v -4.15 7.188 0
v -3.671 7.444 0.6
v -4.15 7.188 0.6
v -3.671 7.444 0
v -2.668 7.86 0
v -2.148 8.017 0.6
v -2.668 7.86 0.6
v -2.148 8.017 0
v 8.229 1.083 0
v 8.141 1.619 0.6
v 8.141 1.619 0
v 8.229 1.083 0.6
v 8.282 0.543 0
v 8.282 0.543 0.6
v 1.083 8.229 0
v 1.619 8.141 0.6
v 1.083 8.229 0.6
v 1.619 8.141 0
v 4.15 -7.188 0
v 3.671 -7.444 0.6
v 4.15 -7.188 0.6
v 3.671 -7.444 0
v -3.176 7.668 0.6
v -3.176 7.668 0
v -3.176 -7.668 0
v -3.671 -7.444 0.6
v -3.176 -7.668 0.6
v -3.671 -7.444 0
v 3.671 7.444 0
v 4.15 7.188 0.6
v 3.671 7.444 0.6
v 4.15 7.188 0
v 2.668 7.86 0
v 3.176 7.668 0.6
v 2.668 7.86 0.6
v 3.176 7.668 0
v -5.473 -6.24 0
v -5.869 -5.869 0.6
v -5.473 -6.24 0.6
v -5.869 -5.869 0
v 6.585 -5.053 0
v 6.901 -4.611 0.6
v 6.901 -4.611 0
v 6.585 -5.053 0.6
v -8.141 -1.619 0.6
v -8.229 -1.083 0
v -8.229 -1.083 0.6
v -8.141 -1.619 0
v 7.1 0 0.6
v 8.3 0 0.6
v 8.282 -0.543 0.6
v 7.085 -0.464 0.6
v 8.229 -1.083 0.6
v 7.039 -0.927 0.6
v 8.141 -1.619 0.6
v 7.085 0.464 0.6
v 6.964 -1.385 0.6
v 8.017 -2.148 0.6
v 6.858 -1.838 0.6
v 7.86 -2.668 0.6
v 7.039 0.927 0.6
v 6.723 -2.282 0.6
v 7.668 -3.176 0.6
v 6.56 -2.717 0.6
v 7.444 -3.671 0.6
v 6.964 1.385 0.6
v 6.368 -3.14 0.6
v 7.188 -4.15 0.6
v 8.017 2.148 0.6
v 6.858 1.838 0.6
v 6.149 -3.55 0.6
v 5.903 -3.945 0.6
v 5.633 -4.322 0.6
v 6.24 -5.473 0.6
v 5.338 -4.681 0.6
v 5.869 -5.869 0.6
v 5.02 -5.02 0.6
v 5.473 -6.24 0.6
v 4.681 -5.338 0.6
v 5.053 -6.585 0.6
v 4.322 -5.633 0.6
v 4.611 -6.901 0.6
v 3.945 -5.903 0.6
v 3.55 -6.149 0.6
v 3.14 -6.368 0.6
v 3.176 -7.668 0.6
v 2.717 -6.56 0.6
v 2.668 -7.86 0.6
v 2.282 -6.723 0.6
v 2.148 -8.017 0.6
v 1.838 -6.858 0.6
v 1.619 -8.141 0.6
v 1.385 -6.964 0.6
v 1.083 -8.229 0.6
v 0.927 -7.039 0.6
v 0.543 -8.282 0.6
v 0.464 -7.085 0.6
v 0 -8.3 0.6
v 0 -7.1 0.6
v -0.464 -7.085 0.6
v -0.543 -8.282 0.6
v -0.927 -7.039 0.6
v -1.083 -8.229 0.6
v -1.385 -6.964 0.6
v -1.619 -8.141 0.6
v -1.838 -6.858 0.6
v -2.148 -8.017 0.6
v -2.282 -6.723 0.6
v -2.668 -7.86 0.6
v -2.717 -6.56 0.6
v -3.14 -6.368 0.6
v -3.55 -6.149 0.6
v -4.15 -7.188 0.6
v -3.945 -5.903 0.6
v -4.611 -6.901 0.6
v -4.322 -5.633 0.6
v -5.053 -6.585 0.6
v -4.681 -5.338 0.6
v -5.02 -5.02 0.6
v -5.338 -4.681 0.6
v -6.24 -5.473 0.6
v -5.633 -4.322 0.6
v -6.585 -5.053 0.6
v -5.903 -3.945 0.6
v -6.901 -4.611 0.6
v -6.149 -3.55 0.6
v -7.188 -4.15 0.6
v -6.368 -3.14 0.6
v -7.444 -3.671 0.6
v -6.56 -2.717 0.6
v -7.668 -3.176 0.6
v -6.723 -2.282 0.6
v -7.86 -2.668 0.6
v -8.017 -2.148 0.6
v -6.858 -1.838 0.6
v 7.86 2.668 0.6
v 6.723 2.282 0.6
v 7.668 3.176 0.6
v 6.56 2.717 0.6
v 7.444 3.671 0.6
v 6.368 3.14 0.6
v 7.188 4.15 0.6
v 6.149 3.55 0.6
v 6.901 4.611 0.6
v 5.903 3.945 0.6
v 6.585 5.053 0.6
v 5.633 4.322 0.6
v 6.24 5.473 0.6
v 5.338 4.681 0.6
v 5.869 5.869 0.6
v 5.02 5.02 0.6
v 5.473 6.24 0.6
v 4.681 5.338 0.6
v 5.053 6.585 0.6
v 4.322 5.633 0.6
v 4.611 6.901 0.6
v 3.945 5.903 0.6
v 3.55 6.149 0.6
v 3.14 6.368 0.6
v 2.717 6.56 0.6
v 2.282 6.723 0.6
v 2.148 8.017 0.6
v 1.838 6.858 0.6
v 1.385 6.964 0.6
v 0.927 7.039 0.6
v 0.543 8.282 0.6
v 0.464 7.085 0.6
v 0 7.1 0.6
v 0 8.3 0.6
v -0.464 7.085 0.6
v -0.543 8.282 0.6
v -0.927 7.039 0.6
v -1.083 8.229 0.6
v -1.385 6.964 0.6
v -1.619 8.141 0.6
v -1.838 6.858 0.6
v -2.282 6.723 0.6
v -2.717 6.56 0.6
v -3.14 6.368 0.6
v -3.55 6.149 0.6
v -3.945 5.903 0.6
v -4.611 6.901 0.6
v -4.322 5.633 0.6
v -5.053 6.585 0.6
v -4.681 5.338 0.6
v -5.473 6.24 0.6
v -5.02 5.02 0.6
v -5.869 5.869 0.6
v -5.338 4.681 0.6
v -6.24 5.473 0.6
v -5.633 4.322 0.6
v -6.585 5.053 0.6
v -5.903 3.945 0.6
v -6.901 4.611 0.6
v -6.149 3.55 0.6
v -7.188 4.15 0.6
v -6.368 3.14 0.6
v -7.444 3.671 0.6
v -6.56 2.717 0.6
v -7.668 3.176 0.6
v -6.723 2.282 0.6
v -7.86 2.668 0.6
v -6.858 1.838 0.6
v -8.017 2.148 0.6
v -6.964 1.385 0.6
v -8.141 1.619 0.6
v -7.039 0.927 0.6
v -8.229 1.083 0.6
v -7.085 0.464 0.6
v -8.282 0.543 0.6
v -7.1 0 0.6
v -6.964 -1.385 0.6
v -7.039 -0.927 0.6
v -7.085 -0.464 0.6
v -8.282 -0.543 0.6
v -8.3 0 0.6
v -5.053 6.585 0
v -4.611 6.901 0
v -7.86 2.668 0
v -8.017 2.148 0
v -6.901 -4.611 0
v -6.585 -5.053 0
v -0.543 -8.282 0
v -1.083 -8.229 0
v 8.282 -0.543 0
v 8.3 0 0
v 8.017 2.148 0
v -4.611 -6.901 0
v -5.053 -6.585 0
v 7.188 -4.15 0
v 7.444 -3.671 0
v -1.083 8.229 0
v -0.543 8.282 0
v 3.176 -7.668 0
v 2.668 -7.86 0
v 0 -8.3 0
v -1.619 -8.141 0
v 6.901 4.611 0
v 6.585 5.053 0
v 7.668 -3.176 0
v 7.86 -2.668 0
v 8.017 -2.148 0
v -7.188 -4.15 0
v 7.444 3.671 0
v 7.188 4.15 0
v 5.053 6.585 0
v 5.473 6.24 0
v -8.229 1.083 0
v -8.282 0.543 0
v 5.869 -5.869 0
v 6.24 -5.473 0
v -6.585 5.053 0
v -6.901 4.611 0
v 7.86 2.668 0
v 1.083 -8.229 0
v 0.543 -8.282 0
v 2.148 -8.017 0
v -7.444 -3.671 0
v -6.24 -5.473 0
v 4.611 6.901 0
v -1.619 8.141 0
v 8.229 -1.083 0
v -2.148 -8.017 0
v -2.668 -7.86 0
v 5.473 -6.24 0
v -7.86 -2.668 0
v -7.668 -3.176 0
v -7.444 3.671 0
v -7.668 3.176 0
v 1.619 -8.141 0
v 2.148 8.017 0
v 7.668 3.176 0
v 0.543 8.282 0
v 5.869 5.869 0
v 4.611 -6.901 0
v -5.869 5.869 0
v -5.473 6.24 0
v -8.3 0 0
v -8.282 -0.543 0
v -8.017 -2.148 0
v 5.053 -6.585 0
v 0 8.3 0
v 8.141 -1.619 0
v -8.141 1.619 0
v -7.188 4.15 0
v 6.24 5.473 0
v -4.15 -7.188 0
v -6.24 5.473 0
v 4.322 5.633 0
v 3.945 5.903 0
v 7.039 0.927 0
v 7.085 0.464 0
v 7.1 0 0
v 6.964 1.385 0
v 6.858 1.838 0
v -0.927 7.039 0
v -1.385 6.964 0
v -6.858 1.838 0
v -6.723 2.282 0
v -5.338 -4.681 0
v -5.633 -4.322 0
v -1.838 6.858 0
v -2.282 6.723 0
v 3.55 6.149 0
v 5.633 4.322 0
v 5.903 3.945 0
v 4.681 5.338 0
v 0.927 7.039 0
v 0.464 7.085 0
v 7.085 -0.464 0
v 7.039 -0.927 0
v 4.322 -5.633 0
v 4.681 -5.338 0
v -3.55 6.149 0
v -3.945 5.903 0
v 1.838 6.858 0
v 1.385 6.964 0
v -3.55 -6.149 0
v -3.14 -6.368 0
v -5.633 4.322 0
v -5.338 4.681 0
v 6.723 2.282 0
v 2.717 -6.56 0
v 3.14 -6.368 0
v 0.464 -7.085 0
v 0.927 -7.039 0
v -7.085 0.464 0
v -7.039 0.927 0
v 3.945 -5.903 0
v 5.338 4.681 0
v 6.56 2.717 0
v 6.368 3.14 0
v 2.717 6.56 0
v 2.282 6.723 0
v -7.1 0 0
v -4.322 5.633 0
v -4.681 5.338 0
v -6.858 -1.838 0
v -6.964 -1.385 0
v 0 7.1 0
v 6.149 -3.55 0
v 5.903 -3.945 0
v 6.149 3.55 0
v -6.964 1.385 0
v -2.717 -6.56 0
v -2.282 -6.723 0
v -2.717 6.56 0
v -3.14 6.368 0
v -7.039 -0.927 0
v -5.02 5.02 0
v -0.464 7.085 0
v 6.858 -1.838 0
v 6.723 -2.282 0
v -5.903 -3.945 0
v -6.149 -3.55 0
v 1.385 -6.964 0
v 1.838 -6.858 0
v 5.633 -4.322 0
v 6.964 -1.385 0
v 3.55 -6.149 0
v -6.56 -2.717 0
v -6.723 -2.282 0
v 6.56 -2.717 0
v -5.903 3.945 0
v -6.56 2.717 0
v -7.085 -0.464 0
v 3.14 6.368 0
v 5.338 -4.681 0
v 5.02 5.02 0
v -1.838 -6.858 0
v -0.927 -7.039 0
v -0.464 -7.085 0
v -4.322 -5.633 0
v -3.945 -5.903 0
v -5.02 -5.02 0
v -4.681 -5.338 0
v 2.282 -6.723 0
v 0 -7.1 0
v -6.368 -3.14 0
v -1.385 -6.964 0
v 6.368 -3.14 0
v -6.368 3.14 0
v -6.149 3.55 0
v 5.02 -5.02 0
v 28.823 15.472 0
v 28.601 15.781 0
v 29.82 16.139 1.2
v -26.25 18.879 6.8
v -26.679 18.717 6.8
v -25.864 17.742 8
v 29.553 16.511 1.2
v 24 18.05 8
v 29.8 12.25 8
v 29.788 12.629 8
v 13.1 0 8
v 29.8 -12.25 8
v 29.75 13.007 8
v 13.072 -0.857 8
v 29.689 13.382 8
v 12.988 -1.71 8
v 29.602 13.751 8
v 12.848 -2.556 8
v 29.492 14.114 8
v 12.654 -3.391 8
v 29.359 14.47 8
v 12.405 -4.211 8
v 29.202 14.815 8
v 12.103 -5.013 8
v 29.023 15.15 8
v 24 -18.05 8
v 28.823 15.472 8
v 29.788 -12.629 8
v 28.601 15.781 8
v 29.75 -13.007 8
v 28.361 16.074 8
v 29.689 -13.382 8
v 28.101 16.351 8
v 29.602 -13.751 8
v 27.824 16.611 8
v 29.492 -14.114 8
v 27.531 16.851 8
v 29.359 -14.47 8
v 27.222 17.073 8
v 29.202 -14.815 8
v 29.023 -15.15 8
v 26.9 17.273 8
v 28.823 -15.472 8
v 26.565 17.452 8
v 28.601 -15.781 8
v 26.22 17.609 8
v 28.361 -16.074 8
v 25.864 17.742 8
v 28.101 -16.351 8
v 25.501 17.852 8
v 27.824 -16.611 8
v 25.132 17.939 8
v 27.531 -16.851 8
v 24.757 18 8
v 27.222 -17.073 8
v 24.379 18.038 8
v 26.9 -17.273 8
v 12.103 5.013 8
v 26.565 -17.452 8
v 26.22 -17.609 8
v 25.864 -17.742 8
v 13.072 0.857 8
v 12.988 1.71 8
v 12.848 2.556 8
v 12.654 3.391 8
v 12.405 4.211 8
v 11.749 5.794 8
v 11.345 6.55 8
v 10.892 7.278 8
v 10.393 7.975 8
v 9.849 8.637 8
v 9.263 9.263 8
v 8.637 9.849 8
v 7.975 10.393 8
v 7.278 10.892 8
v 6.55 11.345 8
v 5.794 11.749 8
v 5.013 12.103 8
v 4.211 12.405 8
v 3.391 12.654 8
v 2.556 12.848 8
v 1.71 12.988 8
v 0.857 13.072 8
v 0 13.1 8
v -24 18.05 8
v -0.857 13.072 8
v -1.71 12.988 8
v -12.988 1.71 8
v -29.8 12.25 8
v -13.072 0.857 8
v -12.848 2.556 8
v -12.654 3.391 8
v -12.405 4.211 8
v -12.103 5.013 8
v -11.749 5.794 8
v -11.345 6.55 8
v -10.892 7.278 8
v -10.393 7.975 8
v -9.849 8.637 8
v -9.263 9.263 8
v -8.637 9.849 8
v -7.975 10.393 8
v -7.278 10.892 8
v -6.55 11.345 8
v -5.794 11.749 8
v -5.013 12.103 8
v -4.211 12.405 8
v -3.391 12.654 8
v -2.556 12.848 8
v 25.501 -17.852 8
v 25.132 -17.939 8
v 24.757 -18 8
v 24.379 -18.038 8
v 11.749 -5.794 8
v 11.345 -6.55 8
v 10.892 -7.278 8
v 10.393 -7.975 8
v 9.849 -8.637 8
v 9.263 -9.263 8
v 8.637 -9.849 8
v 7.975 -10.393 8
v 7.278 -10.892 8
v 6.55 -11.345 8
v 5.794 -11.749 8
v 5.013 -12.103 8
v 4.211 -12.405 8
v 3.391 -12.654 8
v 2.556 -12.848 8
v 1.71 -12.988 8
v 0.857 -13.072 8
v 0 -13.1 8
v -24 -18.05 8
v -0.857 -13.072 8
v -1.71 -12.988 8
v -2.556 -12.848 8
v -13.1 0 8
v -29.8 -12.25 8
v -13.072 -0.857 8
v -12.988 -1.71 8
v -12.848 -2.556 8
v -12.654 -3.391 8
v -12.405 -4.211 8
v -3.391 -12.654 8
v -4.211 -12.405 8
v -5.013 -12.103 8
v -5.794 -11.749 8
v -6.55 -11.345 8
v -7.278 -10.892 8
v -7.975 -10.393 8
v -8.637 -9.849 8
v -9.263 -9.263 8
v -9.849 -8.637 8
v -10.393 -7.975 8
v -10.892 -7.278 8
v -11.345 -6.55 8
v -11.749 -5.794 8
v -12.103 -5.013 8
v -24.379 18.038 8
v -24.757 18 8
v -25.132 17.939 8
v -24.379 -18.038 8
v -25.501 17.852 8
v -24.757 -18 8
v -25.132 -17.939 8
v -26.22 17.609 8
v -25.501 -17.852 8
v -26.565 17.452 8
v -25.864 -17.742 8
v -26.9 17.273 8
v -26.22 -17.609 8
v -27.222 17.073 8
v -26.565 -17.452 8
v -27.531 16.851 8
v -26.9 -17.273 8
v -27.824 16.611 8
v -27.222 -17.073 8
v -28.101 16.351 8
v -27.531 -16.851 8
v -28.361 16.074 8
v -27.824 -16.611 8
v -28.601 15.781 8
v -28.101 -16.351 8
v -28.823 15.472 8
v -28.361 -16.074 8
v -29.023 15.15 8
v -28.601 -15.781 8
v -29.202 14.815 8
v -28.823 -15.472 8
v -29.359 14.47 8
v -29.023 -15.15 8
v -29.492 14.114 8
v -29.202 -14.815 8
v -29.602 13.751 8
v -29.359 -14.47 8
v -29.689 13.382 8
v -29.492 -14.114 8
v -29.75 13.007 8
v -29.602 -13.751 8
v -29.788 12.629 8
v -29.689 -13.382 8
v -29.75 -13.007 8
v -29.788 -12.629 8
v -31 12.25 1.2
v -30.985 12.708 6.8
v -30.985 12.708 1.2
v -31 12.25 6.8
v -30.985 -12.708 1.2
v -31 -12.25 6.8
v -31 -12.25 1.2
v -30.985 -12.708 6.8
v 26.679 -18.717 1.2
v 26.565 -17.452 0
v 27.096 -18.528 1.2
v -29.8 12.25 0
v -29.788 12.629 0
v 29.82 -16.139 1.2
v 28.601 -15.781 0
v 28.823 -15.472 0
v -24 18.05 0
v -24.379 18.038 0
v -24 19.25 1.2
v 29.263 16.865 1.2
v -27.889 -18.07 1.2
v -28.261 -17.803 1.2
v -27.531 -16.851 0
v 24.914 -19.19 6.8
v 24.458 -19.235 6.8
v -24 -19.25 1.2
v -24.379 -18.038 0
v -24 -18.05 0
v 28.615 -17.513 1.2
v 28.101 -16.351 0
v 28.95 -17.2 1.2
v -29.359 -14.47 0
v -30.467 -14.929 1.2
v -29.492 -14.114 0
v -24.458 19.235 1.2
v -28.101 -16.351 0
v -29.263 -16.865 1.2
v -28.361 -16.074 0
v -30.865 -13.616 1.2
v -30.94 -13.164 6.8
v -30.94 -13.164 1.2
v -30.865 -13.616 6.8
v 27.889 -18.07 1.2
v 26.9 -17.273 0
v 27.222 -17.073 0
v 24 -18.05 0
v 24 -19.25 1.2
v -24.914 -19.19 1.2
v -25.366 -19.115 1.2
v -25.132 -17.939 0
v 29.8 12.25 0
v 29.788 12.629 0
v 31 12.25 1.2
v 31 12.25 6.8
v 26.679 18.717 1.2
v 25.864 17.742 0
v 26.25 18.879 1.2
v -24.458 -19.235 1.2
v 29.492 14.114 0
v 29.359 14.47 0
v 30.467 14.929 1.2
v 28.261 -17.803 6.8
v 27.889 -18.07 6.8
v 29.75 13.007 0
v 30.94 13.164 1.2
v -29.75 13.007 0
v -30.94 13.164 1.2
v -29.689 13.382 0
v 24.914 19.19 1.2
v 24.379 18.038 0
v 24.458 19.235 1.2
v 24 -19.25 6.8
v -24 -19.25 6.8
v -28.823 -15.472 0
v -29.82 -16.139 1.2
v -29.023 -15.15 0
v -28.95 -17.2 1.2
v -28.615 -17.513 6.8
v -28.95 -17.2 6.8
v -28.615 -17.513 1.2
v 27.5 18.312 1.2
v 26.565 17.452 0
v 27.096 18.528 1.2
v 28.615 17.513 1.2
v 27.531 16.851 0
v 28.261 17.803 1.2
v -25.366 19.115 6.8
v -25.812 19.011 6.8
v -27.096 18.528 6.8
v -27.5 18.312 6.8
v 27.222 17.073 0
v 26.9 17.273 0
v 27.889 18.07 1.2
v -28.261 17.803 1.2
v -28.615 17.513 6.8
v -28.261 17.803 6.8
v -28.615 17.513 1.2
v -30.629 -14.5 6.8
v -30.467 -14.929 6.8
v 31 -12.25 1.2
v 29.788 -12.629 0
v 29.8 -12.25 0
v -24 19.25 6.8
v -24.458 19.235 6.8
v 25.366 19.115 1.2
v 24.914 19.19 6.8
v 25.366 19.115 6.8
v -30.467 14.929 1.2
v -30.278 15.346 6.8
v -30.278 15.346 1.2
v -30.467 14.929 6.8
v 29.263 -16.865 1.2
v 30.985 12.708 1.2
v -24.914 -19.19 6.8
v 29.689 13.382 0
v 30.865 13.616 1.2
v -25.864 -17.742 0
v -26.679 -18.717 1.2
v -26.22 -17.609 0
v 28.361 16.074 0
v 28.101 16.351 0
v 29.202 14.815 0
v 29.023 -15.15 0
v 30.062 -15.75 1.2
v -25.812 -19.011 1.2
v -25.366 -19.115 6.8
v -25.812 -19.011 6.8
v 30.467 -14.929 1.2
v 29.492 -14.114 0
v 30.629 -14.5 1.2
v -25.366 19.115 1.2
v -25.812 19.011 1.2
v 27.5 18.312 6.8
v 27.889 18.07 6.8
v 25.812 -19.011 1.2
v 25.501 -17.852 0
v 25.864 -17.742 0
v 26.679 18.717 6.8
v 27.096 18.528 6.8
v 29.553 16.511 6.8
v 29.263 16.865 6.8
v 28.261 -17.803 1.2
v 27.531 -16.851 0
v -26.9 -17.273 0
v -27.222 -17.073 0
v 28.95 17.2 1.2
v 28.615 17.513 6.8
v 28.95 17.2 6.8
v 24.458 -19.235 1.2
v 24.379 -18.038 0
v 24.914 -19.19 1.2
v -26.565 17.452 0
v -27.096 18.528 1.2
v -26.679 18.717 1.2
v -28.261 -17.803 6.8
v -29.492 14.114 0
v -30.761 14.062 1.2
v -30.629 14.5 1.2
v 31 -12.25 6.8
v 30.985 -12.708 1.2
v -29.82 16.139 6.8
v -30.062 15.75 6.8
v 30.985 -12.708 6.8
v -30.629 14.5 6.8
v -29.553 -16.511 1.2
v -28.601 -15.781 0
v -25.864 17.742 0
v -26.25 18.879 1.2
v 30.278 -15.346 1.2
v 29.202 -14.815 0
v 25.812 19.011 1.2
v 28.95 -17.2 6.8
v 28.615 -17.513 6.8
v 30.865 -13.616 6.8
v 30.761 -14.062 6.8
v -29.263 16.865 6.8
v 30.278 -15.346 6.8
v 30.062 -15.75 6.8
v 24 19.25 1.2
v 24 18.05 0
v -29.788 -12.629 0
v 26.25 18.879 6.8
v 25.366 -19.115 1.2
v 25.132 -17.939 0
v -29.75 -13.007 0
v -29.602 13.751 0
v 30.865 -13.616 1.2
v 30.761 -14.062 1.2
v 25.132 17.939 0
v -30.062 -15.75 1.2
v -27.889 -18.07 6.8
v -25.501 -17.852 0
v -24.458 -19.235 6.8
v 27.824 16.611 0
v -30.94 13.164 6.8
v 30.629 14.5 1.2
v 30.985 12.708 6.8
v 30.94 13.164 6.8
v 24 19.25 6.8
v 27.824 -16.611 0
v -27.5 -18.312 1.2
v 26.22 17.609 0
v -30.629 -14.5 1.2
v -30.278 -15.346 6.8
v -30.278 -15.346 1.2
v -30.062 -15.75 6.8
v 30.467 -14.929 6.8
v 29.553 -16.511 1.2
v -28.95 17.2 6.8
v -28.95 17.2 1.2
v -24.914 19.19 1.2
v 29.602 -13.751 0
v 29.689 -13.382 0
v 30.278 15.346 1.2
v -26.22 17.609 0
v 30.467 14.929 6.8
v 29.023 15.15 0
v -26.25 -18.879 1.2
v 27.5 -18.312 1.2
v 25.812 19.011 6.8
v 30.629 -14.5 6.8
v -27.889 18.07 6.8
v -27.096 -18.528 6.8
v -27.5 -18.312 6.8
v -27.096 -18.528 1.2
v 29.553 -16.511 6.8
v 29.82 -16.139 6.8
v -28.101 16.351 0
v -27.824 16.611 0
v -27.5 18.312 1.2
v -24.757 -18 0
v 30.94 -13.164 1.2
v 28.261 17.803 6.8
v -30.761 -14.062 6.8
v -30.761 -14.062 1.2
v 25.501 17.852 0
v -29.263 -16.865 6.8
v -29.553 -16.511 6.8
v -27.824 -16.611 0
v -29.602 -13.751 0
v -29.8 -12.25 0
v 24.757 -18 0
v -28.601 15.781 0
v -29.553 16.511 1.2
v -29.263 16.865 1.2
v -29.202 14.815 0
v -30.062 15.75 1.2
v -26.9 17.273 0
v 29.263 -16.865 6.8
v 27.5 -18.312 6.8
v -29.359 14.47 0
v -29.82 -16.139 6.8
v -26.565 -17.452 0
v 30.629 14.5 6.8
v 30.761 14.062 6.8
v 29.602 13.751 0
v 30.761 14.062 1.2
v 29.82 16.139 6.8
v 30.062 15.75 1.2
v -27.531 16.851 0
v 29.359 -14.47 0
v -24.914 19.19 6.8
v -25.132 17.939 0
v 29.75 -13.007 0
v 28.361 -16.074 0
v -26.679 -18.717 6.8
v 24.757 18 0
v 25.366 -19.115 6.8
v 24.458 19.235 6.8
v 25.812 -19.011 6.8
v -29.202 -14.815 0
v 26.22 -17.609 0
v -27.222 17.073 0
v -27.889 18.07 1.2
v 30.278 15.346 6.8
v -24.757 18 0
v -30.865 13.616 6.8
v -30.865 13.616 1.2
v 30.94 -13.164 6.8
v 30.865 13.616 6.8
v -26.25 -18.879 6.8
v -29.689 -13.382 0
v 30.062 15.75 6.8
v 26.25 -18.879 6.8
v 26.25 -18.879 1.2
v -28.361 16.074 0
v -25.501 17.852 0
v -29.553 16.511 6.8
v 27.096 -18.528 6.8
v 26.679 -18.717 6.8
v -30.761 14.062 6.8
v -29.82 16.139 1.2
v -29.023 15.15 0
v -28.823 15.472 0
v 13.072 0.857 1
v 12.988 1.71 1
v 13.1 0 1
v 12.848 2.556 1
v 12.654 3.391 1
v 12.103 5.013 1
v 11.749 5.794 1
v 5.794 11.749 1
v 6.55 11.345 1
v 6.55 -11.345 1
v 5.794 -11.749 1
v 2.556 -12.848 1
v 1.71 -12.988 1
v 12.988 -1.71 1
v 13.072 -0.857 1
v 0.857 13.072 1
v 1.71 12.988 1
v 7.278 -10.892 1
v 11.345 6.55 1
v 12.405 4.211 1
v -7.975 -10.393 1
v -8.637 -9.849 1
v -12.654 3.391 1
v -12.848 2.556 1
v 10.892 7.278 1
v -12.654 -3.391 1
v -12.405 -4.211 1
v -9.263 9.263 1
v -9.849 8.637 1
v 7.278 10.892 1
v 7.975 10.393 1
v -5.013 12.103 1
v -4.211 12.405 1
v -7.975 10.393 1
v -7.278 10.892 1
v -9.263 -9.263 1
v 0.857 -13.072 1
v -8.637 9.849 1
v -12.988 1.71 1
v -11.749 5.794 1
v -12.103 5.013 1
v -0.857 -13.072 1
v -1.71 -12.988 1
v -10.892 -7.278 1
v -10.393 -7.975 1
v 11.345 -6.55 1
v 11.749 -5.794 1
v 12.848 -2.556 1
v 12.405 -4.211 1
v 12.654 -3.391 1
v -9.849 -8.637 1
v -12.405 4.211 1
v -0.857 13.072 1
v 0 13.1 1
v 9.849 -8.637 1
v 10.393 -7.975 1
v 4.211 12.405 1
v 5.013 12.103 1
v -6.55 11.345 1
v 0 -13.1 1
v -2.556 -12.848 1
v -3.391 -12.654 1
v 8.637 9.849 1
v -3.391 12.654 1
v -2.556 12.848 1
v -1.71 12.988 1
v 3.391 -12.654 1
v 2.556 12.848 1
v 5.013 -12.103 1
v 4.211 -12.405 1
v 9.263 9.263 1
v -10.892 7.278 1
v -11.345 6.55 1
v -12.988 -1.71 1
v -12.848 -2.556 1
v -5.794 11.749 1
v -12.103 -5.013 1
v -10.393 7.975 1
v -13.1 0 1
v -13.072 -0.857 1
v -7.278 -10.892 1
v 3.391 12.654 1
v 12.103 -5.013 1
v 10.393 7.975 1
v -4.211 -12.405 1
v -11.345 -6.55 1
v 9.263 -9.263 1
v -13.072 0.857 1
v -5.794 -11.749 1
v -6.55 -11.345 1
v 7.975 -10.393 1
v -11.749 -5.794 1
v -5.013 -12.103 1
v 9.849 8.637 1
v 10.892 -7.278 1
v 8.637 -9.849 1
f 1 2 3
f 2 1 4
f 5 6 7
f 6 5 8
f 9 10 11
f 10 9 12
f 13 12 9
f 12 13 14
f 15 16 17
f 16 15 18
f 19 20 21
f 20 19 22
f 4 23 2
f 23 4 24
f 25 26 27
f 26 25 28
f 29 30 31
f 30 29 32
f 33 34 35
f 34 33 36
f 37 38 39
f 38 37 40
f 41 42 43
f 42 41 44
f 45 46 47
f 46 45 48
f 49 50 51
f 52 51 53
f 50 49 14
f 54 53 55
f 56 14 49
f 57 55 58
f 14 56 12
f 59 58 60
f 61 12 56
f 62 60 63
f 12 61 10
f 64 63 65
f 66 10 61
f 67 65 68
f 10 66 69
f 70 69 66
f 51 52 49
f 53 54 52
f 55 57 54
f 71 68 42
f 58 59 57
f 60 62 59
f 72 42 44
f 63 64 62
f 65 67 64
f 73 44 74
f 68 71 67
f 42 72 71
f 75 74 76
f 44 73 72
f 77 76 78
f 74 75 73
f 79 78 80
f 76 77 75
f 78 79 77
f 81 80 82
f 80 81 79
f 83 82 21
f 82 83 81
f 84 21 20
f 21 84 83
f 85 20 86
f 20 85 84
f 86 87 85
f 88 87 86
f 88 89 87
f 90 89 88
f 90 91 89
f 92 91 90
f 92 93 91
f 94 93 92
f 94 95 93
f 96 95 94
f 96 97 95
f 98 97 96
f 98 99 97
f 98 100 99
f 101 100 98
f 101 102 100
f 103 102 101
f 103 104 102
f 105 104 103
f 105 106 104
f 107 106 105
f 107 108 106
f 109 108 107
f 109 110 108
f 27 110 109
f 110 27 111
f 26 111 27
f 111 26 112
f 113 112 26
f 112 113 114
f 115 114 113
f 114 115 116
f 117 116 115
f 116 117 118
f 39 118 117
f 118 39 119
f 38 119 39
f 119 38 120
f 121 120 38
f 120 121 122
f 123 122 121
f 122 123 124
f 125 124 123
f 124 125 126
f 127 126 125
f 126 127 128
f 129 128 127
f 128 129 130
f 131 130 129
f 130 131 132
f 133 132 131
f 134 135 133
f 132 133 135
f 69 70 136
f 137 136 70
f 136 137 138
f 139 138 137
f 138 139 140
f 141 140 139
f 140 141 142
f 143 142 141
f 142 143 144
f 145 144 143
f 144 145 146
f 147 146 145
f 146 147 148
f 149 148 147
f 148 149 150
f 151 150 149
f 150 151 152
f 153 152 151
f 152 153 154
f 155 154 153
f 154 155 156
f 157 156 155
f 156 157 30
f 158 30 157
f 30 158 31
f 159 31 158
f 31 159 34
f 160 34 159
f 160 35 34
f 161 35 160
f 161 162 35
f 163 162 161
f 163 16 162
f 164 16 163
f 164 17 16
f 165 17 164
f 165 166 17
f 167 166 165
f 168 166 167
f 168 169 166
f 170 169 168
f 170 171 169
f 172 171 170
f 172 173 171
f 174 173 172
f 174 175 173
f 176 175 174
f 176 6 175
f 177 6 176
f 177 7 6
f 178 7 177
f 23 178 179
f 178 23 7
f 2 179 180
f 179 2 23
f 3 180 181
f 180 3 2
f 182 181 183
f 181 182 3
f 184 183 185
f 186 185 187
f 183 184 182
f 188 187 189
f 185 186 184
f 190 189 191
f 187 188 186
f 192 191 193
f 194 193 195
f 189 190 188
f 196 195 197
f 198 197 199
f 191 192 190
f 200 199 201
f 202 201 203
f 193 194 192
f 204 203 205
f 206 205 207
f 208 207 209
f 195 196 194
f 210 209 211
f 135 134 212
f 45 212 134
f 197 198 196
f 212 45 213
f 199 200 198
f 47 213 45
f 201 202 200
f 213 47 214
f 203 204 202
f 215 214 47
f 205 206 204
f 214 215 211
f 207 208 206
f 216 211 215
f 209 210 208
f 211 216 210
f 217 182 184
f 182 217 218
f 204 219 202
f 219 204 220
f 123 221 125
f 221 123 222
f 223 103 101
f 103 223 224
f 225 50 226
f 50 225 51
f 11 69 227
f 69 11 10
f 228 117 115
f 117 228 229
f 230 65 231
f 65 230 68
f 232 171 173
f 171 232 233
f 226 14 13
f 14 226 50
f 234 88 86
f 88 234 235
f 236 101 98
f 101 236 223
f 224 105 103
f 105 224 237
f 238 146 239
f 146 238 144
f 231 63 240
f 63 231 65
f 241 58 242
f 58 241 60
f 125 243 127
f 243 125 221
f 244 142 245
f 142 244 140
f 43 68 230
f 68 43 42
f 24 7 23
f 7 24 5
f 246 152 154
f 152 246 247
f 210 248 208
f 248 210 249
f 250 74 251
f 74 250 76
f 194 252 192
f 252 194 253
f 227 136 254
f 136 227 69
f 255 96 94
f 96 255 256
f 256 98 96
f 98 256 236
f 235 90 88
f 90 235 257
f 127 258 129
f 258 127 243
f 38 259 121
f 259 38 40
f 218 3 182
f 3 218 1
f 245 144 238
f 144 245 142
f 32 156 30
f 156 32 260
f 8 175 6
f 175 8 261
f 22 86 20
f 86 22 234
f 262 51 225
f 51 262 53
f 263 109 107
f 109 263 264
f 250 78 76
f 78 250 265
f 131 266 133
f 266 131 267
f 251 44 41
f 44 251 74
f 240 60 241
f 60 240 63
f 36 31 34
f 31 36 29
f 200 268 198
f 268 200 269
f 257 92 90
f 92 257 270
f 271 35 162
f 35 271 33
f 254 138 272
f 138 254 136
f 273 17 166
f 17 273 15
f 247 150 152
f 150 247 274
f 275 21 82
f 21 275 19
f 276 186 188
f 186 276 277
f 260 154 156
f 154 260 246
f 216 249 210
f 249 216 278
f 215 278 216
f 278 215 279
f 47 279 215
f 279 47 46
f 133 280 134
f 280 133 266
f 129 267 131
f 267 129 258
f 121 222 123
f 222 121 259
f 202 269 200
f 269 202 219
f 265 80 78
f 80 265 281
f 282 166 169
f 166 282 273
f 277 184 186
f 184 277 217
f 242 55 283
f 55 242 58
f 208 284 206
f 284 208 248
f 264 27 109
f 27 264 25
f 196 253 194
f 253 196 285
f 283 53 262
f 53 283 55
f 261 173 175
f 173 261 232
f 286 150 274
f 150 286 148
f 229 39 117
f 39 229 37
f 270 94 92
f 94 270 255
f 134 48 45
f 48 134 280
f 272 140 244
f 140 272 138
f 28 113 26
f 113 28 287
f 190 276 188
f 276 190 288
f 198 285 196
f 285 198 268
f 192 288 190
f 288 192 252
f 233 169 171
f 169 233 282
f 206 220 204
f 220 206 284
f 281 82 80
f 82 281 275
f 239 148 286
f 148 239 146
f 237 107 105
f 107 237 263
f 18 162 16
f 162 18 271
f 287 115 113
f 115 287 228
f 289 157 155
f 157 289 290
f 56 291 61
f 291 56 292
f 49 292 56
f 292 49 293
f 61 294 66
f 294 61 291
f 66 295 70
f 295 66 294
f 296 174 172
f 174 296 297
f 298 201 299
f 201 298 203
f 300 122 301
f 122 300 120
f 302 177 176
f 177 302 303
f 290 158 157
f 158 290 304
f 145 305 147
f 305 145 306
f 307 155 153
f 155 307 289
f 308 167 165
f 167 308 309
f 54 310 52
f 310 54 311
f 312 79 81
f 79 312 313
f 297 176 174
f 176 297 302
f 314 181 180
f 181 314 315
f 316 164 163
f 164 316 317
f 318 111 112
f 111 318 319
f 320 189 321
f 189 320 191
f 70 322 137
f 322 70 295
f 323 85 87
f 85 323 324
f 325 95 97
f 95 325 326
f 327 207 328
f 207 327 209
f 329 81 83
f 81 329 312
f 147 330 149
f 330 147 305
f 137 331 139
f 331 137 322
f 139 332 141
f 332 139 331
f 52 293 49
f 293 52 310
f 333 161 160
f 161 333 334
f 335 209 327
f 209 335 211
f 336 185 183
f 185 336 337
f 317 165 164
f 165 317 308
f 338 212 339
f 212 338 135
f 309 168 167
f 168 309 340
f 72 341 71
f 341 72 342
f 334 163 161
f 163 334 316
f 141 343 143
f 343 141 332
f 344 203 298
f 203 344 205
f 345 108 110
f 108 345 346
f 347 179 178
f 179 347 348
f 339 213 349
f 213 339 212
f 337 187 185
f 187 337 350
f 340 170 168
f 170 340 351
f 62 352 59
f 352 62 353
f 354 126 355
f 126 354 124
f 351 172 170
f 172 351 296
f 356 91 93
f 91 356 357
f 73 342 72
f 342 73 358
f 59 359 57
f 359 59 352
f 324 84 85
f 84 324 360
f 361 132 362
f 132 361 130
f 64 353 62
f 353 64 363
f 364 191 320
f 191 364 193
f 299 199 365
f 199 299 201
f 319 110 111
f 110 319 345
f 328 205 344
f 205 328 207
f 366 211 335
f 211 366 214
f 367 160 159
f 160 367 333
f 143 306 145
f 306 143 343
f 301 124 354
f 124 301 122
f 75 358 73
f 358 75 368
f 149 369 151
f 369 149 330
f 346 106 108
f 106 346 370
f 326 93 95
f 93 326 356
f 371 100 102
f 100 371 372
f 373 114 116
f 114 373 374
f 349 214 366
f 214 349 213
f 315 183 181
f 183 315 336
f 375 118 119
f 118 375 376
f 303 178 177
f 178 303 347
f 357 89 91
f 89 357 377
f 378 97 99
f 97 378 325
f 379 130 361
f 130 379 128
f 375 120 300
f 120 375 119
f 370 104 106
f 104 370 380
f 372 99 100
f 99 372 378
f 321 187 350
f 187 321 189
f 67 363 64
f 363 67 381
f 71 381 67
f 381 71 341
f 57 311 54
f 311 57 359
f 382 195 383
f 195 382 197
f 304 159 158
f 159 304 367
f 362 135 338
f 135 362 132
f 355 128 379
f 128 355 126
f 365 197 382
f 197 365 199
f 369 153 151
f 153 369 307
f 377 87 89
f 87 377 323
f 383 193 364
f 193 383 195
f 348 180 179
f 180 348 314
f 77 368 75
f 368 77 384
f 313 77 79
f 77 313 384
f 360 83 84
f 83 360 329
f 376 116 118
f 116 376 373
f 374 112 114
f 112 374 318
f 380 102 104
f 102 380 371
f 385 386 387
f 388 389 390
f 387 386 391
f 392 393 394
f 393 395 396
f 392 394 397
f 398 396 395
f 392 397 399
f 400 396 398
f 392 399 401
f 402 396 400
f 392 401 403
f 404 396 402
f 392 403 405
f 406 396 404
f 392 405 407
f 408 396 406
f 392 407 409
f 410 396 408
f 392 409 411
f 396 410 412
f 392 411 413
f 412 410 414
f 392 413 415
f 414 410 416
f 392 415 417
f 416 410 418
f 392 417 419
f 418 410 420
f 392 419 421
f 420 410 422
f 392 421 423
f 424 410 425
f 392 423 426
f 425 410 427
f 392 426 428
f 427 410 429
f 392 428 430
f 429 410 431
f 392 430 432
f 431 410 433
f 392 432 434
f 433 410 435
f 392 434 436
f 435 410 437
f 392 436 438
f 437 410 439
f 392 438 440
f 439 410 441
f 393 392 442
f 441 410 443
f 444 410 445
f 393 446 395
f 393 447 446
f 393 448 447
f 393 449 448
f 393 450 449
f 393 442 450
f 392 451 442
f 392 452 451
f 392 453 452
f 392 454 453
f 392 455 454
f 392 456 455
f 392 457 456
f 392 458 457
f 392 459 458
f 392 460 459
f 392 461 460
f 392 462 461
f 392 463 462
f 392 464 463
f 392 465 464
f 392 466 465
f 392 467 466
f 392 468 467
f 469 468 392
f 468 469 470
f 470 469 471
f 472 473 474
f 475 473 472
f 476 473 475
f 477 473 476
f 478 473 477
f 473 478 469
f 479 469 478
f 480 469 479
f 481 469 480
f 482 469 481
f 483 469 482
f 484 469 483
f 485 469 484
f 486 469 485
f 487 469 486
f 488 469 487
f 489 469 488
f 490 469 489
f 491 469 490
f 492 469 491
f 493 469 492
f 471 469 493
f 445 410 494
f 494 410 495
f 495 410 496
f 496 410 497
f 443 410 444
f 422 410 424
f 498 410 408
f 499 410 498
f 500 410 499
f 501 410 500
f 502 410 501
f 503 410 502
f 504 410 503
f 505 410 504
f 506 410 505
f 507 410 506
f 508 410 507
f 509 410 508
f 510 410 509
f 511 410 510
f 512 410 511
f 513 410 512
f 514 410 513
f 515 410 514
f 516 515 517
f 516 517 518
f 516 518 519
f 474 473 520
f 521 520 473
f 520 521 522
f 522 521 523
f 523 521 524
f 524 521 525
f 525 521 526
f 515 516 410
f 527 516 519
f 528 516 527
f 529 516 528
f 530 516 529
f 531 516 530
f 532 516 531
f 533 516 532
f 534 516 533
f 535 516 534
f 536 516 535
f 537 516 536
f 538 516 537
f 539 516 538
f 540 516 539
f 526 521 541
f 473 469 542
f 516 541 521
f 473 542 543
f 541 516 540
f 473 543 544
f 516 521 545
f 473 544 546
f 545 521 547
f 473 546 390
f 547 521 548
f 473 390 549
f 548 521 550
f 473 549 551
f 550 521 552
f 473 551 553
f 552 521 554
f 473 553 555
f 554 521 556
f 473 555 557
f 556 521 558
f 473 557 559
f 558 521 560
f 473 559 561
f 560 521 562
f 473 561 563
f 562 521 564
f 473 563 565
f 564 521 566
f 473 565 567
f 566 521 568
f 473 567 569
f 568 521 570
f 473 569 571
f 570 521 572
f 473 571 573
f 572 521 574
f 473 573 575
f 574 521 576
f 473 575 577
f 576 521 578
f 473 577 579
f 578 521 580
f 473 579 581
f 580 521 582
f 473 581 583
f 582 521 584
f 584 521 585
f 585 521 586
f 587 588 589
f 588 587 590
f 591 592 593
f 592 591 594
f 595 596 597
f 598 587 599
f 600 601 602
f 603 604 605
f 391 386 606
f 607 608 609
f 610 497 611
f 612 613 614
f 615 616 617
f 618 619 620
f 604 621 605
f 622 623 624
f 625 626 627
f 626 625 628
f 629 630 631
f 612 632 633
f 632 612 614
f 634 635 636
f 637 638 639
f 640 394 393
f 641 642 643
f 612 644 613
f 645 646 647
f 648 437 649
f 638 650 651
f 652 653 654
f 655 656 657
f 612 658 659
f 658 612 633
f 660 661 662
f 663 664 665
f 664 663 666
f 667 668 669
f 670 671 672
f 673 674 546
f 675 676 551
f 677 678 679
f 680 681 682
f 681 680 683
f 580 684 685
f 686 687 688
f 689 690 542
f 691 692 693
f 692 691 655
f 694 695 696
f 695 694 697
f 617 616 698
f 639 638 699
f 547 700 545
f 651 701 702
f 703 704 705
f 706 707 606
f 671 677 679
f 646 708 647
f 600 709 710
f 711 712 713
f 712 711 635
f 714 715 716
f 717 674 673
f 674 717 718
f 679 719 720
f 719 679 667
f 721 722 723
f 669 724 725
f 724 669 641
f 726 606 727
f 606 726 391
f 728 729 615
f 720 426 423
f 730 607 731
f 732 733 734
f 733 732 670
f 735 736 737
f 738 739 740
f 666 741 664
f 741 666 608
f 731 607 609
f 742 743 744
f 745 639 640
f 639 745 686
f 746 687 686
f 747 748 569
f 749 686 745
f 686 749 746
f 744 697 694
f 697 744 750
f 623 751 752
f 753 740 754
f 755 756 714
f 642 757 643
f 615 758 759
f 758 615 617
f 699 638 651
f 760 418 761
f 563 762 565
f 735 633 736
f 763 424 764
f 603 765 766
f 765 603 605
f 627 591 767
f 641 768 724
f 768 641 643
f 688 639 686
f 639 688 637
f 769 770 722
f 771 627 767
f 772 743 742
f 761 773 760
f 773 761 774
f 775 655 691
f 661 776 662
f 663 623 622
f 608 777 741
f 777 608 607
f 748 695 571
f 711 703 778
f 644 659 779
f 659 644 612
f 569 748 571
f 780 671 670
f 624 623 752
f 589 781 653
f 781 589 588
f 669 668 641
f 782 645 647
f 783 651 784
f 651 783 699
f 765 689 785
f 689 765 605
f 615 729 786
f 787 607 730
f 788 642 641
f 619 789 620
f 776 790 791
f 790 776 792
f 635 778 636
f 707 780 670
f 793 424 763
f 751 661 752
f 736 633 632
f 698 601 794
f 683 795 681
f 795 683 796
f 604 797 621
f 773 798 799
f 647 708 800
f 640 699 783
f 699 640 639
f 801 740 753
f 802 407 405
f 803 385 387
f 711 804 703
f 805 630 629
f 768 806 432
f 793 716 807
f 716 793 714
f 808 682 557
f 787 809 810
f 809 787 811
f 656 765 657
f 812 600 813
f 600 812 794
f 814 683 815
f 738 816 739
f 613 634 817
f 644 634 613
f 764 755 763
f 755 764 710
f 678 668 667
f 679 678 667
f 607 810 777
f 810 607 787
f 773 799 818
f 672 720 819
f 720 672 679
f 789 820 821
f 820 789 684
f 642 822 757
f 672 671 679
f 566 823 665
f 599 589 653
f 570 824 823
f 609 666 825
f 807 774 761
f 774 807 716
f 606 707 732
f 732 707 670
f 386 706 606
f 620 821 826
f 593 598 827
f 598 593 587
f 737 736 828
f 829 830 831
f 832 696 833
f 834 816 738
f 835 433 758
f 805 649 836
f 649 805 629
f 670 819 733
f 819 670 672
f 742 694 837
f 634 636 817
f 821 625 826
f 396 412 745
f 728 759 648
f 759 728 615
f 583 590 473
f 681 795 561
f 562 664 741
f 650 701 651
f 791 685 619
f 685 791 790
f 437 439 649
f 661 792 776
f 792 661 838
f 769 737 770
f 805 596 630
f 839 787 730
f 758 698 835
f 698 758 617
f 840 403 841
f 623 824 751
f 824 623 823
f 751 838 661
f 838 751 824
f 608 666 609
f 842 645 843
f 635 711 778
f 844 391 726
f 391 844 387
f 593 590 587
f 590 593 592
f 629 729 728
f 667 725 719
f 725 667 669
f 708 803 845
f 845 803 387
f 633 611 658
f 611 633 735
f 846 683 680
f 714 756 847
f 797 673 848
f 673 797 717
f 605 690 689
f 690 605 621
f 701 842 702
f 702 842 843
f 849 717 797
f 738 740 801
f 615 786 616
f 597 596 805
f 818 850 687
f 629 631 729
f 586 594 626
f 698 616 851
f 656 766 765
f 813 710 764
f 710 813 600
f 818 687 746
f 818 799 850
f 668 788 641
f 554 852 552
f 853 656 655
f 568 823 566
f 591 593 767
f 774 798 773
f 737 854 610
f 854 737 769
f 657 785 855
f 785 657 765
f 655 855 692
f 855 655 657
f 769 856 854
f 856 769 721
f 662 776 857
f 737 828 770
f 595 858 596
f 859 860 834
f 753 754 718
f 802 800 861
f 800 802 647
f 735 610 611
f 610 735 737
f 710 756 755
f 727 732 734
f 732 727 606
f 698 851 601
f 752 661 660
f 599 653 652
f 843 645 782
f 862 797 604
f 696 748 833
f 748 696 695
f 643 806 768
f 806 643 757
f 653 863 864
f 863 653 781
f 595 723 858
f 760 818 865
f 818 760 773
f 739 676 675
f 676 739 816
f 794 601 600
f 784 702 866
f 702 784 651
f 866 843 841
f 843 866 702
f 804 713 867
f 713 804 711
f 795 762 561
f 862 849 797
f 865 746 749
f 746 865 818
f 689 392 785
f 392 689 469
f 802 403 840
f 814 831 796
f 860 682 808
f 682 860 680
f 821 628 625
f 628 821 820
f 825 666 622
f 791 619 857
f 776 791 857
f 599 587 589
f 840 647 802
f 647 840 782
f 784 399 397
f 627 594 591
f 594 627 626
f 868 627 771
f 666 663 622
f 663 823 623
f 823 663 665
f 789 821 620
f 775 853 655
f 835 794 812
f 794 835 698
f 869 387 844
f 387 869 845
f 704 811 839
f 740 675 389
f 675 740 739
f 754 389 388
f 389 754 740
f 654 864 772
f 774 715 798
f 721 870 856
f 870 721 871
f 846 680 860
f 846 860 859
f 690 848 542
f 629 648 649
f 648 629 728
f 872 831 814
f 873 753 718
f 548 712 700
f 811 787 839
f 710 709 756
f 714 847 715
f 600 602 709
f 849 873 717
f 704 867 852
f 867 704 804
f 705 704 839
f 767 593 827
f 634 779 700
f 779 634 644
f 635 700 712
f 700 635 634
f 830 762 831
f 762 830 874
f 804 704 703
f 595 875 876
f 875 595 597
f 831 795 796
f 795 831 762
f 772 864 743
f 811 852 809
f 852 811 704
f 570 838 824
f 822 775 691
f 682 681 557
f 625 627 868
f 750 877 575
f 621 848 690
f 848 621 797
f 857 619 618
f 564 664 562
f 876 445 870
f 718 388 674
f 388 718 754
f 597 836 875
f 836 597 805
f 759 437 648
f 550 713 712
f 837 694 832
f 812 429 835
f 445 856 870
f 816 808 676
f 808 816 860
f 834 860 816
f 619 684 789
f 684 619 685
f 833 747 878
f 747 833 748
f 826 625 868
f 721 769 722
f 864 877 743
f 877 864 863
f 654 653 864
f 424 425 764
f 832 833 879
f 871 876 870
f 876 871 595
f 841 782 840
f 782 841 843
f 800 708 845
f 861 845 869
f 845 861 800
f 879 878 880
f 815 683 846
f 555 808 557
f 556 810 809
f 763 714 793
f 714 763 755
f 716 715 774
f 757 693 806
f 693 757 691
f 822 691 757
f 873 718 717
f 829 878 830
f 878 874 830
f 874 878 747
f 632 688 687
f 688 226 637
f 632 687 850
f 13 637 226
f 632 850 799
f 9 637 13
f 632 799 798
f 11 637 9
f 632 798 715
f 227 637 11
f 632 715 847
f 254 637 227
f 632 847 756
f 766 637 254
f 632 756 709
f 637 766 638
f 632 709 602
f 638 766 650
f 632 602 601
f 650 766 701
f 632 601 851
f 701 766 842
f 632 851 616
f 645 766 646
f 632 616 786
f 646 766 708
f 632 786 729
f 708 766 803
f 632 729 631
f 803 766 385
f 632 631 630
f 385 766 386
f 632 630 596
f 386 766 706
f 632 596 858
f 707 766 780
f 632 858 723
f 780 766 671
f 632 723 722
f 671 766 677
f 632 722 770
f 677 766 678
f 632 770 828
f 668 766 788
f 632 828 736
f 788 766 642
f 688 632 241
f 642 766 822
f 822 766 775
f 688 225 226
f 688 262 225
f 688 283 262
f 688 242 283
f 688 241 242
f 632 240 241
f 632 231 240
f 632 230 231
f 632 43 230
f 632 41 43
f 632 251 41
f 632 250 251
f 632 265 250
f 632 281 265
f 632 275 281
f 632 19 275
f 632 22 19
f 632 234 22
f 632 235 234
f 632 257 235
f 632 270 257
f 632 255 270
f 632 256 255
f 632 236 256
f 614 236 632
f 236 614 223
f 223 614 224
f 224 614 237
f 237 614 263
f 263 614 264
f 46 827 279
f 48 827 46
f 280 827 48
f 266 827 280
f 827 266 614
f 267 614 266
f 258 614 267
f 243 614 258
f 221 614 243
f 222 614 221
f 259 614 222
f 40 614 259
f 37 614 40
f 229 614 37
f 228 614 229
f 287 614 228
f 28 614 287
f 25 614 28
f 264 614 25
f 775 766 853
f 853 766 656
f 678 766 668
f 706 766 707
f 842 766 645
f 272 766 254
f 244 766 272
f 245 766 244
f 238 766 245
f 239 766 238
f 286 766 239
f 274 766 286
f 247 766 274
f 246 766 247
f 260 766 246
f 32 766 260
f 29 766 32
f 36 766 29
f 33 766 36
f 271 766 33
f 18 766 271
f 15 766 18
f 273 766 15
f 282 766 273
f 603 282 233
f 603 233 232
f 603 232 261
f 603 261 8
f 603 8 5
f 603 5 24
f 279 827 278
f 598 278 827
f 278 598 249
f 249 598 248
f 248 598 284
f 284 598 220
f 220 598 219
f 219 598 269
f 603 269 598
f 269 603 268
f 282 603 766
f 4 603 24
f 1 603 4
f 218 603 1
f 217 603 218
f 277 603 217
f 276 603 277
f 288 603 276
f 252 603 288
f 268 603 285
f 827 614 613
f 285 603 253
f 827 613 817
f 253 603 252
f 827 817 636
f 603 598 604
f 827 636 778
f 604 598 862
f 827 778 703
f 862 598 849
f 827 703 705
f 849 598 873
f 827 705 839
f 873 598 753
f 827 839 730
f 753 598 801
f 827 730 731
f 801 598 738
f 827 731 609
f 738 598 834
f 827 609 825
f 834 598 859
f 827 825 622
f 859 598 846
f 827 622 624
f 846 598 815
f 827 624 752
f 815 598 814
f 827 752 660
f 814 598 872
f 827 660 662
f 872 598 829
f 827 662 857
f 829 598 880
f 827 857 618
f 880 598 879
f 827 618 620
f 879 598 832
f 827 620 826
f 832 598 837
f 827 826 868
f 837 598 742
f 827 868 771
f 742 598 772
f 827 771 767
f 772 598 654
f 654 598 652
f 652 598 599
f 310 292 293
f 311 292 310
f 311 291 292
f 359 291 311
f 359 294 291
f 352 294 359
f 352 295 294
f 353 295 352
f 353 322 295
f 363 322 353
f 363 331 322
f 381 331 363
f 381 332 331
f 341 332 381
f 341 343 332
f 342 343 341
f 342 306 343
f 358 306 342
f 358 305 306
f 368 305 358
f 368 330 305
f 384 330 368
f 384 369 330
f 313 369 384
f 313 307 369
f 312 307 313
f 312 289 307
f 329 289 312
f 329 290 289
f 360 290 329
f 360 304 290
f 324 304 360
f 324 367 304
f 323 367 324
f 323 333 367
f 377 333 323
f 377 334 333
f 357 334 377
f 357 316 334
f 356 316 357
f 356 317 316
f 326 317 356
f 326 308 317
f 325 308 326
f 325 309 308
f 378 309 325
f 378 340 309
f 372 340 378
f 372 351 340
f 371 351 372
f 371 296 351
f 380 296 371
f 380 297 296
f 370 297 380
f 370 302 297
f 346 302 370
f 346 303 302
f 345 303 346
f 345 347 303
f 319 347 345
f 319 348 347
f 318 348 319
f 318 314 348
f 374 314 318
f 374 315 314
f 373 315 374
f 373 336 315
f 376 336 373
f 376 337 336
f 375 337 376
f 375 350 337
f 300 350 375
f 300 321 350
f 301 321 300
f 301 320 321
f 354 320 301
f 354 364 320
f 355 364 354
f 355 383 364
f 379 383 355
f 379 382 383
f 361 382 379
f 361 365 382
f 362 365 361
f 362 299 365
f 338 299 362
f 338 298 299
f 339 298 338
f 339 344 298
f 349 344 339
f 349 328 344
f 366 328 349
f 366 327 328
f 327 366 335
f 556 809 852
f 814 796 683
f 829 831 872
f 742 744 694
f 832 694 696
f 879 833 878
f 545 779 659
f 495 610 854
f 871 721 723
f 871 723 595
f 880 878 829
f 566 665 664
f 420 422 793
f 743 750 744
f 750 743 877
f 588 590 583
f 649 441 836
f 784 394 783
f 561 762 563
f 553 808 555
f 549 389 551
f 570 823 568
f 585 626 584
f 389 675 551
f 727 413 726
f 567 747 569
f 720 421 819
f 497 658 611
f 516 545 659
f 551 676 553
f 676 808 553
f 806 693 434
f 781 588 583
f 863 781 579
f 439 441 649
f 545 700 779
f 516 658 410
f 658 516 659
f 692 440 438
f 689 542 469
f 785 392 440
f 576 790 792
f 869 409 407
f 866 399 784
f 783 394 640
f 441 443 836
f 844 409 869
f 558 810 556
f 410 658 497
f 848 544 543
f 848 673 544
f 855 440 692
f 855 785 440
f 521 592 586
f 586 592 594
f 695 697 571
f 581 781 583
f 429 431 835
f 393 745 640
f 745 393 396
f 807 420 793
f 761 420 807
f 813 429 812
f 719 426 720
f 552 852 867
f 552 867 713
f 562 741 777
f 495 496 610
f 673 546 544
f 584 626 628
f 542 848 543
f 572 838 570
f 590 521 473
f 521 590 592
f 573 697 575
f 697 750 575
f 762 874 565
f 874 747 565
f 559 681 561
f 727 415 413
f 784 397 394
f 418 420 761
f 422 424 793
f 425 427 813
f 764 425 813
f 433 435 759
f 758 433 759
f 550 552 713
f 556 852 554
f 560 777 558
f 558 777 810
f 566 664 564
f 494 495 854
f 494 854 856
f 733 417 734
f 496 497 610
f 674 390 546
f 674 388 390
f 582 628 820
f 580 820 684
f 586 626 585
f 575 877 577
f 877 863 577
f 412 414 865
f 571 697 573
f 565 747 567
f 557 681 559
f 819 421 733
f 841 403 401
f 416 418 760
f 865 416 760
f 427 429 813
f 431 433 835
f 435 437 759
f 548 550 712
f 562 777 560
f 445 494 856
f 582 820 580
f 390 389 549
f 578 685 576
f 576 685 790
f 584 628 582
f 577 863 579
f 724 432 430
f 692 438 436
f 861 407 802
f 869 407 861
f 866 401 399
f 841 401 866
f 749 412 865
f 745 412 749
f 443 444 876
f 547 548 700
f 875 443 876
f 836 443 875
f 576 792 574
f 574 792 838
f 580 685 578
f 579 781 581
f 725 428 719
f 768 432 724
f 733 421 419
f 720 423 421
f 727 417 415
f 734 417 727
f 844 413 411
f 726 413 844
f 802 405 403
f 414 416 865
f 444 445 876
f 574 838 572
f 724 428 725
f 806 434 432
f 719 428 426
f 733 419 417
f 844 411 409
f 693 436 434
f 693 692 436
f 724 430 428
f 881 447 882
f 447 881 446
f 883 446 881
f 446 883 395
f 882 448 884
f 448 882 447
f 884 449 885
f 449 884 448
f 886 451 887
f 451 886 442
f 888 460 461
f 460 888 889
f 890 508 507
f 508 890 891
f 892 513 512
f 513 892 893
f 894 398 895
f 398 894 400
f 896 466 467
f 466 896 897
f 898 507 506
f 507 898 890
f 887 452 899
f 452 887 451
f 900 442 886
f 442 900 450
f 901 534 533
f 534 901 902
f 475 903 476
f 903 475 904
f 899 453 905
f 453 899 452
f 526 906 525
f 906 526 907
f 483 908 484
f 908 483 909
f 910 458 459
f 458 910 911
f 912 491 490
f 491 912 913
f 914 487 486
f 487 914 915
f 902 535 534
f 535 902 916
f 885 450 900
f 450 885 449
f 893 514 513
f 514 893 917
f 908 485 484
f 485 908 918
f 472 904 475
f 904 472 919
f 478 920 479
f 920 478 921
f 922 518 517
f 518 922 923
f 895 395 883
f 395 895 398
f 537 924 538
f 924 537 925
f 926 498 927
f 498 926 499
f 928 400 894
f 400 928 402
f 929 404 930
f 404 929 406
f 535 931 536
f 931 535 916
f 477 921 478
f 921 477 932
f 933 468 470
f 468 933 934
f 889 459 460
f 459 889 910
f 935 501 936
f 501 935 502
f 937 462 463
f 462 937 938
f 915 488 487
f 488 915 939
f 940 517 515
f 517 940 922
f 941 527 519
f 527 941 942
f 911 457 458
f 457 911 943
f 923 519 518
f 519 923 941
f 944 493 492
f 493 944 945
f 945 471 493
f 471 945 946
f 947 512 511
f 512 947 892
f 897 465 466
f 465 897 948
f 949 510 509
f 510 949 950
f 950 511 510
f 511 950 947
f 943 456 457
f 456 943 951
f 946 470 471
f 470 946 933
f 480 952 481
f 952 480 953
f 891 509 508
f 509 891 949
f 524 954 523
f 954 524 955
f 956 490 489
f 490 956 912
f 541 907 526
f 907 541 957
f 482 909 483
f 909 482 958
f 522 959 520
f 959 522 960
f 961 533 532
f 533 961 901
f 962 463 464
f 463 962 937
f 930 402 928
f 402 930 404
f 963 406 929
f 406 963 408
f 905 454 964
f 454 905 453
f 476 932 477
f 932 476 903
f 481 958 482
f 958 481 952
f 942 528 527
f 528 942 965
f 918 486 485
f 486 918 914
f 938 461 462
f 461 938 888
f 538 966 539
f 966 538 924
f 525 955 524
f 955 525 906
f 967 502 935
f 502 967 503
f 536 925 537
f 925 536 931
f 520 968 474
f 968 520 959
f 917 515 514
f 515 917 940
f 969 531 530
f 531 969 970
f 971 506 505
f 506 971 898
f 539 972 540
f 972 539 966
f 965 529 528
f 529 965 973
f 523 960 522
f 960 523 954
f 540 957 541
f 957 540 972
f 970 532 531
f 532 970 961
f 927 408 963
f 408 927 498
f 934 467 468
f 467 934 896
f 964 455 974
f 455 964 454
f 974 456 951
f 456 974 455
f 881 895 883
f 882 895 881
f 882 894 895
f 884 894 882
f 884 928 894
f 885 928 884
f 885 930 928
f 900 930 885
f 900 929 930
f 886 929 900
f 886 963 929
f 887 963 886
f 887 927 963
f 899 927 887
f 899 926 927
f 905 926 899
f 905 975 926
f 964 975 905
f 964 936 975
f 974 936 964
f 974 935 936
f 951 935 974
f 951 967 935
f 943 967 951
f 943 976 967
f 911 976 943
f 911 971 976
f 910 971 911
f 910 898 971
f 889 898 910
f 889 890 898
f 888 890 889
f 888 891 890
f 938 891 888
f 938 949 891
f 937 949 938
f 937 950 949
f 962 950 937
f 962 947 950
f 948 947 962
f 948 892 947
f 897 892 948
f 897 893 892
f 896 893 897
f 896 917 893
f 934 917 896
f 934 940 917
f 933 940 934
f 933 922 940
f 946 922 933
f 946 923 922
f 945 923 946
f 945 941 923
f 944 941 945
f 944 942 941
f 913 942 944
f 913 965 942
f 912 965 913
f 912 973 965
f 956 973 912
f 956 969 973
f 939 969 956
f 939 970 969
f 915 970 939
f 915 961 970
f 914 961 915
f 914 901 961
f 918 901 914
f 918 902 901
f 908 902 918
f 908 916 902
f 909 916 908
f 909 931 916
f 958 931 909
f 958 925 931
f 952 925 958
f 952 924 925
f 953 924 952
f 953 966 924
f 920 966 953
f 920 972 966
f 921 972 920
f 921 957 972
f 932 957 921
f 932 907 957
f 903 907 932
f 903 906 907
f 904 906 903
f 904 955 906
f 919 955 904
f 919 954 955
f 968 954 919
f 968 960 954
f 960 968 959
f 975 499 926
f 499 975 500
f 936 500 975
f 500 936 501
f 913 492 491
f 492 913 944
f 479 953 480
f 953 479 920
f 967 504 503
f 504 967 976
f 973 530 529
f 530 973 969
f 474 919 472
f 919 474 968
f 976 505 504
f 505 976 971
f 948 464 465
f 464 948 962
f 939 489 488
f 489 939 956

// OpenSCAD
// Covers for an NFC sticker, so a tag can sit anywhere and still look like
// part of the product.
//
// Three shapes from one body: the slab is the brick as the app draws it
// (chamfered block, one engraved ring), the puck is the smallest thing that
// hides a 25 mm sticker, and the coaster is wide enough to put a mug on.
//
//   openscad -D 'part="slab"'    -o slab.stl    brick-cover.scad
//   openscad -D 'part="puck"'    -o puck.stl    brick-cover.scad
//   openscad -D 'part="coaster"' -o coaster.stl brick-cover.scad
//
// Printed face down: the engraved face is against the plate, the cavity opens
// upward. Nothing bridges, nothing needs support, and the sticker ends up one
// millimetre from the surface the phone touches.

part = "slab";              // "slab" | "puck" | "coaster"

tag_diameter     = 25;      // NTAG215 sticker, the common size
pocket_clearance = 0.6;     // radial slack so the sticker drops in
face_t           = 1.0;     // material between the sticker and the phone
wall             = 2.6;     // side wall around the cavity

chamfer    = 1.2;
ring_ratio = 0.20;          // engraved ring diameter, as a fraction of the short side
ring_w     = 1.2;
ring_depth = 0.6;

$fn = 96;

// Outside dimensions. The slab keeps the 0.62 aspect the app draws.
slab_w = 62;    slab_h = 38.5;  slab_t = 8;
puck_t = 5;
coaster_w = 92; coaster_h = 92; coaster_t = 6;

pocket_d = tag_diameter + 2 * pocket_clearance;
puck_w   = pocket_d + 2 * wall;

module rounded_slab(w, h, t, r) {
    hull() for (x = [-1, 1], y = [-1, 1])
        translate([x * (w / 2 - r), y * (h / 2 - r), 0])
            cylinder(h = t, r = r);
}

// Chamfered top and bottom edges, as the hull of three stacked plates.
module chamfered_slab(w, h, t, r) {
    inset = max(r - chamfer, 0.6);
    hull() {
        rounded_slab(w - 2 * chamfer, h - 2 * chamfer, 0.01, inset);
        translate([0, 0, chamfer])
            rounded_slab(w, h, t - 2 * chamfer, r);
        translate([0, 0, t - 0.01])
            rounded_slab(w - 2 * chamfer, h - 2 * chamfer, 0.01, inset);
    }
}

// The engraved tap ring, on the face that meets the phone.
module engraved_ring(short_side) {
    d = short_side * ring_ratio * 2;
    translate([0, 0, -0.01])
        difference() {
            cylinder(h = ring_depth + 0.01, d = d + ring_w);
            translate([0, 0, -0.01])
                cylinder(h = ring_depth + 0.03, d = d - ring_w);
        }
}

module cover(w, h, t, r) {
    difference() {
        chamfered_slab(w, h, t, r);
        // Cavity, open at the top: the sticker drops in and sits on the face.
        translate([0, 0, face_t])
            cylinder(h = t, d = pocket_d);
        engraved_ring(min(w, h));
    }
}

if (part == "slab")    cover(slab_w, slab_h, slab_t, 7);
if (part == "puck")    cover(puck_w, puck_w, puck_t, puck_w / 2);
if (part == "coaster") cover(coaster_w, coaster_h, coaster_t, 14);
